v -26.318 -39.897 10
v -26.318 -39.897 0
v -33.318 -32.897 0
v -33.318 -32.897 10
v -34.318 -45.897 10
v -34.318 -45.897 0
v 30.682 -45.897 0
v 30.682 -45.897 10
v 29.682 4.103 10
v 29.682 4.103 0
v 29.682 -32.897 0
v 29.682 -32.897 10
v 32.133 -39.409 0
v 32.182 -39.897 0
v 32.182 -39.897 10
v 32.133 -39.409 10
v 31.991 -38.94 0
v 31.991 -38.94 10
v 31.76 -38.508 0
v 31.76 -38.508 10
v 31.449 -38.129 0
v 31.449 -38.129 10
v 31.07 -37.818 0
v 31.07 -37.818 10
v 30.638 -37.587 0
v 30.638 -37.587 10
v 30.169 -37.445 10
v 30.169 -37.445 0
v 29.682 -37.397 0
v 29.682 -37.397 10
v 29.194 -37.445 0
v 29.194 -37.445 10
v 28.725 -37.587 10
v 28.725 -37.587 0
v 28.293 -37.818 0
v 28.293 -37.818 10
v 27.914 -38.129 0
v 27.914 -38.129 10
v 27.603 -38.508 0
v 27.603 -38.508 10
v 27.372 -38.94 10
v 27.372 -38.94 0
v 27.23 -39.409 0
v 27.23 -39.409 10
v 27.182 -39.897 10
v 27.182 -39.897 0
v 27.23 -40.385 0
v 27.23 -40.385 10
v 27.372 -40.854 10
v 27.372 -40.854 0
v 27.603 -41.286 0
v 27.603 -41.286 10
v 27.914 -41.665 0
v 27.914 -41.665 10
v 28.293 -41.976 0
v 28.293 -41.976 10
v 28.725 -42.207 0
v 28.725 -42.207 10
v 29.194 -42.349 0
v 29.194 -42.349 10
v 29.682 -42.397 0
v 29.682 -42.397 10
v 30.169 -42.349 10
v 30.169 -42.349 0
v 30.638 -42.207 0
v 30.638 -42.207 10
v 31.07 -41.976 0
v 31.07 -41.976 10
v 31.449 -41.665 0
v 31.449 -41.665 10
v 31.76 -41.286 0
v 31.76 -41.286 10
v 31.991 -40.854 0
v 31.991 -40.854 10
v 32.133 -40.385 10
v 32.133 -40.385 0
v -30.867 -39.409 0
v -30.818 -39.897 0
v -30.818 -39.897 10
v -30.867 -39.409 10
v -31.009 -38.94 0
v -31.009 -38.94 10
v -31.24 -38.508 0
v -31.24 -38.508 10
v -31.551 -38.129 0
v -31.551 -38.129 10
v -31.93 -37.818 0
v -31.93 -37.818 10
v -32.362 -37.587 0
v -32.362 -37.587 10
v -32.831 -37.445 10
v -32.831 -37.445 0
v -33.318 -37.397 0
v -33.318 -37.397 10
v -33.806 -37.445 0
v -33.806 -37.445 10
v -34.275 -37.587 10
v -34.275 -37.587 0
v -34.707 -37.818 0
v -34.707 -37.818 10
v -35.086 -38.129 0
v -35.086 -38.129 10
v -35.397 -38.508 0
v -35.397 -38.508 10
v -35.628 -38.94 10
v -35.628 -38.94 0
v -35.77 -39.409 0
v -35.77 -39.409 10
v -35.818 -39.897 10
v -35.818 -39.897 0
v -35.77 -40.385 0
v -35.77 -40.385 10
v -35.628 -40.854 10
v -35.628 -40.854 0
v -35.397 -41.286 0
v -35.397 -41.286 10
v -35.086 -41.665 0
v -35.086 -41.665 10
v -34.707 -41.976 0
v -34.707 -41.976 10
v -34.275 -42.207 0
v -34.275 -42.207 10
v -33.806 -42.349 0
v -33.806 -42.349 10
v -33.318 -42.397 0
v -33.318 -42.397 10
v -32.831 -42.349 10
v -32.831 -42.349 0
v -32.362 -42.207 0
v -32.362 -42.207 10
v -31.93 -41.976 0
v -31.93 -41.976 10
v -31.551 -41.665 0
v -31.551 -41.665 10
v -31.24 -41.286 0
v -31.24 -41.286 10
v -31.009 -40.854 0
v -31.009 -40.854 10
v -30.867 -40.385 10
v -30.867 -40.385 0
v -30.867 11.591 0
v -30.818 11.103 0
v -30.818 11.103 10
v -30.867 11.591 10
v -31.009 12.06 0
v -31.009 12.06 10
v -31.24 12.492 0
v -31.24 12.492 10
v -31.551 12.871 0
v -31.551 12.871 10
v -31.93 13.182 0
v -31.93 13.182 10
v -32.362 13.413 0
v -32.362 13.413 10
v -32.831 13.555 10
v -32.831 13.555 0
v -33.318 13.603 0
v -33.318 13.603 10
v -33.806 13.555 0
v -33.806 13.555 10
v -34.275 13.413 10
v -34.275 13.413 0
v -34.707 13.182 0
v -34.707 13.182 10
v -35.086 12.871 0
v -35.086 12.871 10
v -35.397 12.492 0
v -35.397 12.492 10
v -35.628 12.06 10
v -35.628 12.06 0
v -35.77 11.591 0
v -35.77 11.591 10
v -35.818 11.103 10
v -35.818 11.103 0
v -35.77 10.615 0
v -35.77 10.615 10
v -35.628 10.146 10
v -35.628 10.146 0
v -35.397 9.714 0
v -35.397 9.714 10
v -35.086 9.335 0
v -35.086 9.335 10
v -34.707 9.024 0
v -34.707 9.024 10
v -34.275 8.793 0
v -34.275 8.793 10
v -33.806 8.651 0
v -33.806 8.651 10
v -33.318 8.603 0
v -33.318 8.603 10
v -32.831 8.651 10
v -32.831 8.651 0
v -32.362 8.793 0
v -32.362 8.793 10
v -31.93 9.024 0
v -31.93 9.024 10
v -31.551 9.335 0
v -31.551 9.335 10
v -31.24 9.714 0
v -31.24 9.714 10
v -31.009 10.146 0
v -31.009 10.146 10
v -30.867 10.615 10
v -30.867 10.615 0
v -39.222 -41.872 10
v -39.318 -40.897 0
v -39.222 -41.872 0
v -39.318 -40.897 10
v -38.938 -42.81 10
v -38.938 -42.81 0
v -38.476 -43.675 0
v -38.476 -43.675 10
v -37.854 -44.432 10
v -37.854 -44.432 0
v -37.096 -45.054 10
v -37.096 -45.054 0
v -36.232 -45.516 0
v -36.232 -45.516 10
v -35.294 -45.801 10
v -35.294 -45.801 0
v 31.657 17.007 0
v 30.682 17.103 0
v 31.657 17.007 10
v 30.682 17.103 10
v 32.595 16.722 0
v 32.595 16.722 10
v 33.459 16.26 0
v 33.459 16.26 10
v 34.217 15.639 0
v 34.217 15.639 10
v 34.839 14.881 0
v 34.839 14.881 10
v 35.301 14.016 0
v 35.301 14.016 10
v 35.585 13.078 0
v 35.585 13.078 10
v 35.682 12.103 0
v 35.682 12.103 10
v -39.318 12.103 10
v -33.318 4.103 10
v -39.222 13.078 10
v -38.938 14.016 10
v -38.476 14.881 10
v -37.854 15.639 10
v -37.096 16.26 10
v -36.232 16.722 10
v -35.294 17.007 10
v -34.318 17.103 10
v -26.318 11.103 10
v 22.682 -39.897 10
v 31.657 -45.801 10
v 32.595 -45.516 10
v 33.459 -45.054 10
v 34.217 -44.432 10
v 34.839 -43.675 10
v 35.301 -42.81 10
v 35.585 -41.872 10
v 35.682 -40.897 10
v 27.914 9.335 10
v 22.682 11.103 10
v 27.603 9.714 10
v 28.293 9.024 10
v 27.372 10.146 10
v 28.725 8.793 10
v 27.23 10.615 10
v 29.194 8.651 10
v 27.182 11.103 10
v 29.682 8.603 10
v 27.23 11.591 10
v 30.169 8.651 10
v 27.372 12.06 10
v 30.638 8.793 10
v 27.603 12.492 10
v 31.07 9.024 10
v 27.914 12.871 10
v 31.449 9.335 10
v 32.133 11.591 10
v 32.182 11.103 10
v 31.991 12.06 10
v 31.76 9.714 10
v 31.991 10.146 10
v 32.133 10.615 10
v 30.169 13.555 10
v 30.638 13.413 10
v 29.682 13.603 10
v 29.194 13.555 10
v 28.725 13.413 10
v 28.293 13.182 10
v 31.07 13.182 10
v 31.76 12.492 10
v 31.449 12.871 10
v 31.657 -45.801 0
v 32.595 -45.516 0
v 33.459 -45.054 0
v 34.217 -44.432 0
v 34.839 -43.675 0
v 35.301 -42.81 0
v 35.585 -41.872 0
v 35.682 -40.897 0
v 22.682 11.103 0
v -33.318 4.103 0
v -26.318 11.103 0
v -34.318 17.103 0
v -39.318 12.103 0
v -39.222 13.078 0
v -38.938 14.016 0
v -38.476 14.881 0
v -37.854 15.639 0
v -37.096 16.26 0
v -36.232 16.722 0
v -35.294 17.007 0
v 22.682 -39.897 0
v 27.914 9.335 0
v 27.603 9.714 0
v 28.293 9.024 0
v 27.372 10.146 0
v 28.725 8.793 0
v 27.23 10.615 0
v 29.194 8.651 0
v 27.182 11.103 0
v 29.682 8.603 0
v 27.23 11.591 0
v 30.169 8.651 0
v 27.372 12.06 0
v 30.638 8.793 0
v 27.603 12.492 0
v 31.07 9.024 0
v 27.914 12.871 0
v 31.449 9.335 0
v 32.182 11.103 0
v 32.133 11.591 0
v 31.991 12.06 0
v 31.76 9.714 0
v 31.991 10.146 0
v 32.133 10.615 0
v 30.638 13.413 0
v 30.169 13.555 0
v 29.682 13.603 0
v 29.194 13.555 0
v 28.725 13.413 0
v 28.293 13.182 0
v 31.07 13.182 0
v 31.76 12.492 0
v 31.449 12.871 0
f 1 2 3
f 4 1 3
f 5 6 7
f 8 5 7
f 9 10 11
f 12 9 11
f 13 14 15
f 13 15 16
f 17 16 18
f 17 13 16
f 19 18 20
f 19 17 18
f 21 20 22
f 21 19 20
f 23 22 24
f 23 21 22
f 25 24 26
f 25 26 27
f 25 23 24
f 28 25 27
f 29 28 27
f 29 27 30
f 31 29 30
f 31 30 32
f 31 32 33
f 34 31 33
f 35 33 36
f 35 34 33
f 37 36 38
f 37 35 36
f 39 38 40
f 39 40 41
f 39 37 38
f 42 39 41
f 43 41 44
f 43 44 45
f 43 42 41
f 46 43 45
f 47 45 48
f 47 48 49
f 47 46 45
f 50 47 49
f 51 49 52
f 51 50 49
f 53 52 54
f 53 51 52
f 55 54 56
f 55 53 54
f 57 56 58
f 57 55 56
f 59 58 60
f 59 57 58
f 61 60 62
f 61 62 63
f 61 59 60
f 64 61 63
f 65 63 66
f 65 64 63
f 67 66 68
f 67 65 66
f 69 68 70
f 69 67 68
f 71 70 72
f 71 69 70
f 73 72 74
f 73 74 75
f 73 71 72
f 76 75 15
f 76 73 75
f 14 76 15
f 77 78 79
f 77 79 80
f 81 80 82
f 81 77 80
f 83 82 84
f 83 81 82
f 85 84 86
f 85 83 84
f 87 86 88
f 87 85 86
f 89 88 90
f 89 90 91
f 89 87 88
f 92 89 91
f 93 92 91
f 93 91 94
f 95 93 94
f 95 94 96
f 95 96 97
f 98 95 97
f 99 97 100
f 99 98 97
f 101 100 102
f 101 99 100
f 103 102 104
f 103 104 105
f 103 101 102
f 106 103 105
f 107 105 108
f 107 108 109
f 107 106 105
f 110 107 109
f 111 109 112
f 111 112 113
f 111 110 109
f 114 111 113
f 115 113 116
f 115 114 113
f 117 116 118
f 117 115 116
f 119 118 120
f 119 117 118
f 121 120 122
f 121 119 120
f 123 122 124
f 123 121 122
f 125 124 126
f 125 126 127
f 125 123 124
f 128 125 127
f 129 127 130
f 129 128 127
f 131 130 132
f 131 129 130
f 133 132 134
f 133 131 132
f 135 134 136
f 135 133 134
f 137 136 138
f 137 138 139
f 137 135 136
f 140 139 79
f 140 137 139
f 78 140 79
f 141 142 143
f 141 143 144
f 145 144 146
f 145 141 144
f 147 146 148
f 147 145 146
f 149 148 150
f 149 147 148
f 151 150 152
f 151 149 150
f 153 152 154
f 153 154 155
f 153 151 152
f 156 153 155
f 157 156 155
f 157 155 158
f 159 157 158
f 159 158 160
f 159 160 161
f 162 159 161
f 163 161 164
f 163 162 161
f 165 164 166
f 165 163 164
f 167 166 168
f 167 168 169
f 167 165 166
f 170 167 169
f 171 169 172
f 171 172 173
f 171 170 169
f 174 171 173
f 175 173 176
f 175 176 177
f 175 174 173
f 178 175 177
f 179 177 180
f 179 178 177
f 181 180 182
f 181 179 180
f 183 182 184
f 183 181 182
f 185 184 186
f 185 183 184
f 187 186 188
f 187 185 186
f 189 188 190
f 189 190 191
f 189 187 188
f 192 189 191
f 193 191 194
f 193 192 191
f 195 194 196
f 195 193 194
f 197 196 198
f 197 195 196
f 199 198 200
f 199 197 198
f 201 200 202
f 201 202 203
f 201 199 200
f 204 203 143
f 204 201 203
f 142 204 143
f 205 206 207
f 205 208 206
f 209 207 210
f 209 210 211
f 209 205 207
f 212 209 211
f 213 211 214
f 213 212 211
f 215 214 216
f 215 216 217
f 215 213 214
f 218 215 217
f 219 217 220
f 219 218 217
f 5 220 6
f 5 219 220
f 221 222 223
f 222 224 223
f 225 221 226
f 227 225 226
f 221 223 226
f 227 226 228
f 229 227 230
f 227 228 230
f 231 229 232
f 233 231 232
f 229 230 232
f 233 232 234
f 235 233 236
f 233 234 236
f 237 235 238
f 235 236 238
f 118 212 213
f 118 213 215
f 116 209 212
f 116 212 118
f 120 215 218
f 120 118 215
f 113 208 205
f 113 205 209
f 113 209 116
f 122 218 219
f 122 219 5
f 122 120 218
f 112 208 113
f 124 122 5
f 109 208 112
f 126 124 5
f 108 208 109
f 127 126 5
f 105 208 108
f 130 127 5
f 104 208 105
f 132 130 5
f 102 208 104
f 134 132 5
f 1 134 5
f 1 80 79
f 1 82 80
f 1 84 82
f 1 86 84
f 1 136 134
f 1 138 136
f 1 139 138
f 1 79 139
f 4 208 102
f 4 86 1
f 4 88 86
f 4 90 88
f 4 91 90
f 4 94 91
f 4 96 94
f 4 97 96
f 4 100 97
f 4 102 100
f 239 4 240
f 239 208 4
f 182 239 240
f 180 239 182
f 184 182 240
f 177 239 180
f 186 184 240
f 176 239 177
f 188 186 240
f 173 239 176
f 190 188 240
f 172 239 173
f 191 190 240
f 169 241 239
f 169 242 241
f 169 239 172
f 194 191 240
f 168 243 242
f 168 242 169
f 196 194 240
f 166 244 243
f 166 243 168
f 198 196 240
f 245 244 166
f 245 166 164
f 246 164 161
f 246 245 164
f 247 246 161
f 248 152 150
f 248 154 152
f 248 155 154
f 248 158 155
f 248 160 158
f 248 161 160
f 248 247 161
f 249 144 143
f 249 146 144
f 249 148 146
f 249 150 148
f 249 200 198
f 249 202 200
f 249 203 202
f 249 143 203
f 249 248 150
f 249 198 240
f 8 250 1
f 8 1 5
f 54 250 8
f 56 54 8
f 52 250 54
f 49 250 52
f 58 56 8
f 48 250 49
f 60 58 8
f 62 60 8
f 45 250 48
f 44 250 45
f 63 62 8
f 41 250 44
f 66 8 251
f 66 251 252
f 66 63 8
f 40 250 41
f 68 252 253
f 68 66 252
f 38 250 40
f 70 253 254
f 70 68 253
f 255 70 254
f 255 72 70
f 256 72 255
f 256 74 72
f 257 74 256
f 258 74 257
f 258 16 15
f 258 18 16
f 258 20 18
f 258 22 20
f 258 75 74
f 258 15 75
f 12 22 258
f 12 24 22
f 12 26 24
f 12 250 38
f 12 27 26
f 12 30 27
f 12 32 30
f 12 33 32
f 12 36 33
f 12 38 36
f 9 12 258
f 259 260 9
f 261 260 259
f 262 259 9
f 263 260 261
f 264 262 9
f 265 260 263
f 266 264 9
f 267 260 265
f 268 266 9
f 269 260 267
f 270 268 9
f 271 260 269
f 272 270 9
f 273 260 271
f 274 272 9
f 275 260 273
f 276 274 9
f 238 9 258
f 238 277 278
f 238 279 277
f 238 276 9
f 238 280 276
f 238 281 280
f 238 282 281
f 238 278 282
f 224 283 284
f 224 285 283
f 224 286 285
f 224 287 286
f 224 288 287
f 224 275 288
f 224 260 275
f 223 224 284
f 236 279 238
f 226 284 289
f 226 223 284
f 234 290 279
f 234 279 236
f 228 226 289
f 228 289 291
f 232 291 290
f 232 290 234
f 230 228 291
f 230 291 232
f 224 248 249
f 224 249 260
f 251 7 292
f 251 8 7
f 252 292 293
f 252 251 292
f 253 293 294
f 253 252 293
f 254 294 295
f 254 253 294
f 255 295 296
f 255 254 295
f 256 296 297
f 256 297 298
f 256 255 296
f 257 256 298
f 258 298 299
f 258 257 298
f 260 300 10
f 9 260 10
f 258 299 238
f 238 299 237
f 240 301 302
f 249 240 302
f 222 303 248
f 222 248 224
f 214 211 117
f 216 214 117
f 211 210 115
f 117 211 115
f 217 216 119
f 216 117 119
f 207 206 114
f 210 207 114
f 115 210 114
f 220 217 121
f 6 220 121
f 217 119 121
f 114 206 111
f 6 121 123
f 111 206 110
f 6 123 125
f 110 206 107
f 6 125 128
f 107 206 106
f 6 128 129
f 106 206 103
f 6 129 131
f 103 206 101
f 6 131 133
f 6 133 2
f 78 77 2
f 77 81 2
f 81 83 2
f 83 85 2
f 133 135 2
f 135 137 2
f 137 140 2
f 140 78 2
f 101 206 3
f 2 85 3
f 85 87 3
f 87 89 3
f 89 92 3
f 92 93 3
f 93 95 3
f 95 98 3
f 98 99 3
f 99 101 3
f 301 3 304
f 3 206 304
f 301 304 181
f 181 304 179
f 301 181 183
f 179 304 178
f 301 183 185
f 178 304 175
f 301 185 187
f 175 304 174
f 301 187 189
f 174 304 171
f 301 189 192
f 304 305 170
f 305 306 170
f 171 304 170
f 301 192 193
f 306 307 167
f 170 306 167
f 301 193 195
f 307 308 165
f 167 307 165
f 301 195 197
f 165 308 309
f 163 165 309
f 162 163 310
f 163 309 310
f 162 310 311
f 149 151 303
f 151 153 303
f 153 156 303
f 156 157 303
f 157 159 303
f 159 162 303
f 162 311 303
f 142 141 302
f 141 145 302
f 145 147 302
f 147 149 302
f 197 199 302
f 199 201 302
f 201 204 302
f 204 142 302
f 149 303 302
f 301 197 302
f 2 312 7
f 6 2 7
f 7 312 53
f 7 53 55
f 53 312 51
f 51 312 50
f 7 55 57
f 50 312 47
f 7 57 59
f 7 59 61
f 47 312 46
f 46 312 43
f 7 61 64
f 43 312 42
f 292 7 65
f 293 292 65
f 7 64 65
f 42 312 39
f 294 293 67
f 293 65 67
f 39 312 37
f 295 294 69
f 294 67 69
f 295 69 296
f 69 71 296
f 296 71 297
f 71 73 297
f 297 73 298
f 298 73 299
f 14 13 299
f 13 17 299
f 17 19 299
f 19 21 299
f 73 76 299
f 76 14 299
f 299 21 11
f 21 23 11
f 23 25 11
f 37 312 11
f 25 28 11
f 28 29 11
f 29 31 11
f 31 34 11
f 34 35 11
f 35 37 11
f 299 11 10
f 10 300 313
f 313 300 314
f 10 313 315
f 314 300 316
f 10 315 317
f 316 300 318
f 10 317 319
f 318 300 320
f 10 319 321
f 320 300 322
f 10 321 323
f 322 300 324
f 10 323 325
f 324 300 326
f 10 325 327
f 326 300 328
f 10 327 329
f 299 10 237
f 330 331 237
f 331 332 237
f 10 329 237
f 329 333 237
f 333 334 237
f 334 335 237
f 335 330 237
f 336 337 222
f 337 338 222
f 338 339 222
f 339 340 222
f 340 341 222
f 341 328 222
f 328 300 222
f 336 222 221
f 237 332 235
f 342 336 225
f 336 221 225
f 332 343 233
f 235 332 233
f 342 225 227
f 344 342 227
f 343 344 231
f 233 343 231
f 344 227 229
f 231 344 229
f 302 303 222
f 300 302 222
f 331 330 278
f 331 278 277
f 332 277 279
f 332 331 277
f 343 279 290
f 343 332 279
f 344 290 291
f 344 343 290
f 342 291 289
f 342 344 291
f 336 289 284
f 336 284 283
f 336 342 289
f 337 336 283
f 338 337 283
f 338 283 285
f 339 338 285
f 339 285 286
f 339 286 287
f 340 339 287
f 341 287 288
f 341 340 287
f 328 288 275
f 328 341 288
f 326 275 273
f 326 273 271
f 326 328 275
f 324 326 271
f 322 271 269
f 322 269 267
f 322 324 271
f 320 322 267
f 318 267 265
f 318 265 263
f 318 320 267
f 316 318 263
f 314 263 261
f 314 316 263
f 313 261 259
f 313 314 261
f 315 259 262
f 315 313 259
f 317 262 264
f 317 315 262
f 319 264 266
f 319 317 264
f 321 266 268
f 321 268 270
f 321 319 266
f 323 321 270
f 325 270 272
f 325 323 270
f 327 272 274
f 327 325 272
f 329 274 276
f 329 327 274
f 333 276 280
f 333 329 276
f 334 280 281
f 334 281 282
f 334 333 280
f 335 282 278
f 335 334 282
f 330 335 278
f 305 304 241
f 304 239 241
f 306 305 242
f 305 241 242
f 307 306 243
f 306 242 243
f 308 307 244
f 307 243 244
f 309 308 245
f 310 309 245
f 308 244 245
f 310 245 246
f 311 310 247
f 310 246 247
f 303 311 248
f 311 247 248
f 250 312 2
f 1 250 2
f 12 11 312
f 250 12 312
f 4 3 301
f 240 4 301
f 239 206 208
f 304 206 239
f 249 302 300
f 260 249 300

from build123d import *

# Parameters (mm, degrees)
SKETCH1_W           = 75
SKETCH1_H           = 63
SKETCH1_R           = 2.5
BOSS_EXTRUDE1_DEPTH = 10
FILLET1_R           = 5


with BuildPart() as part:
    # Sketch1 → Boss-Extrude1 (new body)
    with BuildSketch(Plane.XY):
        with Locations((-1.818499155, -14.396959459)):
            Rectangle(SKETCH1_W, SKETCH1_H)
        with Locations((-33.318499155, 11.103040541)):
            Circle(SKETCH1_R, mode=Mode.SUBTRACT)
        with Locations((29.681500845, 11.103040541)):
            Circle(SKETCH1_R, mode=Mode.SUBTRACT)
        with Locations((29.681500845, -39.896959459)):
            Circle(SKETCH1_R, mode=Mode.SUBTRACT)
        with Locations((-33.318499155, -39.896959459)):
            Circle(SKETCH1_R, mode=Mode.SUBTRACT)
        Polygon((-33.318499155, 4.103040541), (-26.318499155, 11.103040541), (22.681500845, 11.103040541), (29.681500845, 4.103040541), (29.681500845, -32.896959459), (22.681500845, -39.896959459), (-26.318499155, -39.896959459), (-33.318499155, -32.896959459), align=None, mode=Mode.SUBTRACT)
    extrude(amount=BOSS_EXTRUDE1_DEPTH)

    # Fillet1
    fillet1_edges = [part.edges().sort_by_distance(p)[0] for p in [
        (-39.318499155, 17.103040541, 5),
        (35.681500845, 17.103040541, 5),
        (35.681500845, -45.896959459, 5),
        (-39.318499155, -45.896959459, 5),
    ]]
    fillet(fillet1_edges, radius=FILLET1_R)


solid = part.part
